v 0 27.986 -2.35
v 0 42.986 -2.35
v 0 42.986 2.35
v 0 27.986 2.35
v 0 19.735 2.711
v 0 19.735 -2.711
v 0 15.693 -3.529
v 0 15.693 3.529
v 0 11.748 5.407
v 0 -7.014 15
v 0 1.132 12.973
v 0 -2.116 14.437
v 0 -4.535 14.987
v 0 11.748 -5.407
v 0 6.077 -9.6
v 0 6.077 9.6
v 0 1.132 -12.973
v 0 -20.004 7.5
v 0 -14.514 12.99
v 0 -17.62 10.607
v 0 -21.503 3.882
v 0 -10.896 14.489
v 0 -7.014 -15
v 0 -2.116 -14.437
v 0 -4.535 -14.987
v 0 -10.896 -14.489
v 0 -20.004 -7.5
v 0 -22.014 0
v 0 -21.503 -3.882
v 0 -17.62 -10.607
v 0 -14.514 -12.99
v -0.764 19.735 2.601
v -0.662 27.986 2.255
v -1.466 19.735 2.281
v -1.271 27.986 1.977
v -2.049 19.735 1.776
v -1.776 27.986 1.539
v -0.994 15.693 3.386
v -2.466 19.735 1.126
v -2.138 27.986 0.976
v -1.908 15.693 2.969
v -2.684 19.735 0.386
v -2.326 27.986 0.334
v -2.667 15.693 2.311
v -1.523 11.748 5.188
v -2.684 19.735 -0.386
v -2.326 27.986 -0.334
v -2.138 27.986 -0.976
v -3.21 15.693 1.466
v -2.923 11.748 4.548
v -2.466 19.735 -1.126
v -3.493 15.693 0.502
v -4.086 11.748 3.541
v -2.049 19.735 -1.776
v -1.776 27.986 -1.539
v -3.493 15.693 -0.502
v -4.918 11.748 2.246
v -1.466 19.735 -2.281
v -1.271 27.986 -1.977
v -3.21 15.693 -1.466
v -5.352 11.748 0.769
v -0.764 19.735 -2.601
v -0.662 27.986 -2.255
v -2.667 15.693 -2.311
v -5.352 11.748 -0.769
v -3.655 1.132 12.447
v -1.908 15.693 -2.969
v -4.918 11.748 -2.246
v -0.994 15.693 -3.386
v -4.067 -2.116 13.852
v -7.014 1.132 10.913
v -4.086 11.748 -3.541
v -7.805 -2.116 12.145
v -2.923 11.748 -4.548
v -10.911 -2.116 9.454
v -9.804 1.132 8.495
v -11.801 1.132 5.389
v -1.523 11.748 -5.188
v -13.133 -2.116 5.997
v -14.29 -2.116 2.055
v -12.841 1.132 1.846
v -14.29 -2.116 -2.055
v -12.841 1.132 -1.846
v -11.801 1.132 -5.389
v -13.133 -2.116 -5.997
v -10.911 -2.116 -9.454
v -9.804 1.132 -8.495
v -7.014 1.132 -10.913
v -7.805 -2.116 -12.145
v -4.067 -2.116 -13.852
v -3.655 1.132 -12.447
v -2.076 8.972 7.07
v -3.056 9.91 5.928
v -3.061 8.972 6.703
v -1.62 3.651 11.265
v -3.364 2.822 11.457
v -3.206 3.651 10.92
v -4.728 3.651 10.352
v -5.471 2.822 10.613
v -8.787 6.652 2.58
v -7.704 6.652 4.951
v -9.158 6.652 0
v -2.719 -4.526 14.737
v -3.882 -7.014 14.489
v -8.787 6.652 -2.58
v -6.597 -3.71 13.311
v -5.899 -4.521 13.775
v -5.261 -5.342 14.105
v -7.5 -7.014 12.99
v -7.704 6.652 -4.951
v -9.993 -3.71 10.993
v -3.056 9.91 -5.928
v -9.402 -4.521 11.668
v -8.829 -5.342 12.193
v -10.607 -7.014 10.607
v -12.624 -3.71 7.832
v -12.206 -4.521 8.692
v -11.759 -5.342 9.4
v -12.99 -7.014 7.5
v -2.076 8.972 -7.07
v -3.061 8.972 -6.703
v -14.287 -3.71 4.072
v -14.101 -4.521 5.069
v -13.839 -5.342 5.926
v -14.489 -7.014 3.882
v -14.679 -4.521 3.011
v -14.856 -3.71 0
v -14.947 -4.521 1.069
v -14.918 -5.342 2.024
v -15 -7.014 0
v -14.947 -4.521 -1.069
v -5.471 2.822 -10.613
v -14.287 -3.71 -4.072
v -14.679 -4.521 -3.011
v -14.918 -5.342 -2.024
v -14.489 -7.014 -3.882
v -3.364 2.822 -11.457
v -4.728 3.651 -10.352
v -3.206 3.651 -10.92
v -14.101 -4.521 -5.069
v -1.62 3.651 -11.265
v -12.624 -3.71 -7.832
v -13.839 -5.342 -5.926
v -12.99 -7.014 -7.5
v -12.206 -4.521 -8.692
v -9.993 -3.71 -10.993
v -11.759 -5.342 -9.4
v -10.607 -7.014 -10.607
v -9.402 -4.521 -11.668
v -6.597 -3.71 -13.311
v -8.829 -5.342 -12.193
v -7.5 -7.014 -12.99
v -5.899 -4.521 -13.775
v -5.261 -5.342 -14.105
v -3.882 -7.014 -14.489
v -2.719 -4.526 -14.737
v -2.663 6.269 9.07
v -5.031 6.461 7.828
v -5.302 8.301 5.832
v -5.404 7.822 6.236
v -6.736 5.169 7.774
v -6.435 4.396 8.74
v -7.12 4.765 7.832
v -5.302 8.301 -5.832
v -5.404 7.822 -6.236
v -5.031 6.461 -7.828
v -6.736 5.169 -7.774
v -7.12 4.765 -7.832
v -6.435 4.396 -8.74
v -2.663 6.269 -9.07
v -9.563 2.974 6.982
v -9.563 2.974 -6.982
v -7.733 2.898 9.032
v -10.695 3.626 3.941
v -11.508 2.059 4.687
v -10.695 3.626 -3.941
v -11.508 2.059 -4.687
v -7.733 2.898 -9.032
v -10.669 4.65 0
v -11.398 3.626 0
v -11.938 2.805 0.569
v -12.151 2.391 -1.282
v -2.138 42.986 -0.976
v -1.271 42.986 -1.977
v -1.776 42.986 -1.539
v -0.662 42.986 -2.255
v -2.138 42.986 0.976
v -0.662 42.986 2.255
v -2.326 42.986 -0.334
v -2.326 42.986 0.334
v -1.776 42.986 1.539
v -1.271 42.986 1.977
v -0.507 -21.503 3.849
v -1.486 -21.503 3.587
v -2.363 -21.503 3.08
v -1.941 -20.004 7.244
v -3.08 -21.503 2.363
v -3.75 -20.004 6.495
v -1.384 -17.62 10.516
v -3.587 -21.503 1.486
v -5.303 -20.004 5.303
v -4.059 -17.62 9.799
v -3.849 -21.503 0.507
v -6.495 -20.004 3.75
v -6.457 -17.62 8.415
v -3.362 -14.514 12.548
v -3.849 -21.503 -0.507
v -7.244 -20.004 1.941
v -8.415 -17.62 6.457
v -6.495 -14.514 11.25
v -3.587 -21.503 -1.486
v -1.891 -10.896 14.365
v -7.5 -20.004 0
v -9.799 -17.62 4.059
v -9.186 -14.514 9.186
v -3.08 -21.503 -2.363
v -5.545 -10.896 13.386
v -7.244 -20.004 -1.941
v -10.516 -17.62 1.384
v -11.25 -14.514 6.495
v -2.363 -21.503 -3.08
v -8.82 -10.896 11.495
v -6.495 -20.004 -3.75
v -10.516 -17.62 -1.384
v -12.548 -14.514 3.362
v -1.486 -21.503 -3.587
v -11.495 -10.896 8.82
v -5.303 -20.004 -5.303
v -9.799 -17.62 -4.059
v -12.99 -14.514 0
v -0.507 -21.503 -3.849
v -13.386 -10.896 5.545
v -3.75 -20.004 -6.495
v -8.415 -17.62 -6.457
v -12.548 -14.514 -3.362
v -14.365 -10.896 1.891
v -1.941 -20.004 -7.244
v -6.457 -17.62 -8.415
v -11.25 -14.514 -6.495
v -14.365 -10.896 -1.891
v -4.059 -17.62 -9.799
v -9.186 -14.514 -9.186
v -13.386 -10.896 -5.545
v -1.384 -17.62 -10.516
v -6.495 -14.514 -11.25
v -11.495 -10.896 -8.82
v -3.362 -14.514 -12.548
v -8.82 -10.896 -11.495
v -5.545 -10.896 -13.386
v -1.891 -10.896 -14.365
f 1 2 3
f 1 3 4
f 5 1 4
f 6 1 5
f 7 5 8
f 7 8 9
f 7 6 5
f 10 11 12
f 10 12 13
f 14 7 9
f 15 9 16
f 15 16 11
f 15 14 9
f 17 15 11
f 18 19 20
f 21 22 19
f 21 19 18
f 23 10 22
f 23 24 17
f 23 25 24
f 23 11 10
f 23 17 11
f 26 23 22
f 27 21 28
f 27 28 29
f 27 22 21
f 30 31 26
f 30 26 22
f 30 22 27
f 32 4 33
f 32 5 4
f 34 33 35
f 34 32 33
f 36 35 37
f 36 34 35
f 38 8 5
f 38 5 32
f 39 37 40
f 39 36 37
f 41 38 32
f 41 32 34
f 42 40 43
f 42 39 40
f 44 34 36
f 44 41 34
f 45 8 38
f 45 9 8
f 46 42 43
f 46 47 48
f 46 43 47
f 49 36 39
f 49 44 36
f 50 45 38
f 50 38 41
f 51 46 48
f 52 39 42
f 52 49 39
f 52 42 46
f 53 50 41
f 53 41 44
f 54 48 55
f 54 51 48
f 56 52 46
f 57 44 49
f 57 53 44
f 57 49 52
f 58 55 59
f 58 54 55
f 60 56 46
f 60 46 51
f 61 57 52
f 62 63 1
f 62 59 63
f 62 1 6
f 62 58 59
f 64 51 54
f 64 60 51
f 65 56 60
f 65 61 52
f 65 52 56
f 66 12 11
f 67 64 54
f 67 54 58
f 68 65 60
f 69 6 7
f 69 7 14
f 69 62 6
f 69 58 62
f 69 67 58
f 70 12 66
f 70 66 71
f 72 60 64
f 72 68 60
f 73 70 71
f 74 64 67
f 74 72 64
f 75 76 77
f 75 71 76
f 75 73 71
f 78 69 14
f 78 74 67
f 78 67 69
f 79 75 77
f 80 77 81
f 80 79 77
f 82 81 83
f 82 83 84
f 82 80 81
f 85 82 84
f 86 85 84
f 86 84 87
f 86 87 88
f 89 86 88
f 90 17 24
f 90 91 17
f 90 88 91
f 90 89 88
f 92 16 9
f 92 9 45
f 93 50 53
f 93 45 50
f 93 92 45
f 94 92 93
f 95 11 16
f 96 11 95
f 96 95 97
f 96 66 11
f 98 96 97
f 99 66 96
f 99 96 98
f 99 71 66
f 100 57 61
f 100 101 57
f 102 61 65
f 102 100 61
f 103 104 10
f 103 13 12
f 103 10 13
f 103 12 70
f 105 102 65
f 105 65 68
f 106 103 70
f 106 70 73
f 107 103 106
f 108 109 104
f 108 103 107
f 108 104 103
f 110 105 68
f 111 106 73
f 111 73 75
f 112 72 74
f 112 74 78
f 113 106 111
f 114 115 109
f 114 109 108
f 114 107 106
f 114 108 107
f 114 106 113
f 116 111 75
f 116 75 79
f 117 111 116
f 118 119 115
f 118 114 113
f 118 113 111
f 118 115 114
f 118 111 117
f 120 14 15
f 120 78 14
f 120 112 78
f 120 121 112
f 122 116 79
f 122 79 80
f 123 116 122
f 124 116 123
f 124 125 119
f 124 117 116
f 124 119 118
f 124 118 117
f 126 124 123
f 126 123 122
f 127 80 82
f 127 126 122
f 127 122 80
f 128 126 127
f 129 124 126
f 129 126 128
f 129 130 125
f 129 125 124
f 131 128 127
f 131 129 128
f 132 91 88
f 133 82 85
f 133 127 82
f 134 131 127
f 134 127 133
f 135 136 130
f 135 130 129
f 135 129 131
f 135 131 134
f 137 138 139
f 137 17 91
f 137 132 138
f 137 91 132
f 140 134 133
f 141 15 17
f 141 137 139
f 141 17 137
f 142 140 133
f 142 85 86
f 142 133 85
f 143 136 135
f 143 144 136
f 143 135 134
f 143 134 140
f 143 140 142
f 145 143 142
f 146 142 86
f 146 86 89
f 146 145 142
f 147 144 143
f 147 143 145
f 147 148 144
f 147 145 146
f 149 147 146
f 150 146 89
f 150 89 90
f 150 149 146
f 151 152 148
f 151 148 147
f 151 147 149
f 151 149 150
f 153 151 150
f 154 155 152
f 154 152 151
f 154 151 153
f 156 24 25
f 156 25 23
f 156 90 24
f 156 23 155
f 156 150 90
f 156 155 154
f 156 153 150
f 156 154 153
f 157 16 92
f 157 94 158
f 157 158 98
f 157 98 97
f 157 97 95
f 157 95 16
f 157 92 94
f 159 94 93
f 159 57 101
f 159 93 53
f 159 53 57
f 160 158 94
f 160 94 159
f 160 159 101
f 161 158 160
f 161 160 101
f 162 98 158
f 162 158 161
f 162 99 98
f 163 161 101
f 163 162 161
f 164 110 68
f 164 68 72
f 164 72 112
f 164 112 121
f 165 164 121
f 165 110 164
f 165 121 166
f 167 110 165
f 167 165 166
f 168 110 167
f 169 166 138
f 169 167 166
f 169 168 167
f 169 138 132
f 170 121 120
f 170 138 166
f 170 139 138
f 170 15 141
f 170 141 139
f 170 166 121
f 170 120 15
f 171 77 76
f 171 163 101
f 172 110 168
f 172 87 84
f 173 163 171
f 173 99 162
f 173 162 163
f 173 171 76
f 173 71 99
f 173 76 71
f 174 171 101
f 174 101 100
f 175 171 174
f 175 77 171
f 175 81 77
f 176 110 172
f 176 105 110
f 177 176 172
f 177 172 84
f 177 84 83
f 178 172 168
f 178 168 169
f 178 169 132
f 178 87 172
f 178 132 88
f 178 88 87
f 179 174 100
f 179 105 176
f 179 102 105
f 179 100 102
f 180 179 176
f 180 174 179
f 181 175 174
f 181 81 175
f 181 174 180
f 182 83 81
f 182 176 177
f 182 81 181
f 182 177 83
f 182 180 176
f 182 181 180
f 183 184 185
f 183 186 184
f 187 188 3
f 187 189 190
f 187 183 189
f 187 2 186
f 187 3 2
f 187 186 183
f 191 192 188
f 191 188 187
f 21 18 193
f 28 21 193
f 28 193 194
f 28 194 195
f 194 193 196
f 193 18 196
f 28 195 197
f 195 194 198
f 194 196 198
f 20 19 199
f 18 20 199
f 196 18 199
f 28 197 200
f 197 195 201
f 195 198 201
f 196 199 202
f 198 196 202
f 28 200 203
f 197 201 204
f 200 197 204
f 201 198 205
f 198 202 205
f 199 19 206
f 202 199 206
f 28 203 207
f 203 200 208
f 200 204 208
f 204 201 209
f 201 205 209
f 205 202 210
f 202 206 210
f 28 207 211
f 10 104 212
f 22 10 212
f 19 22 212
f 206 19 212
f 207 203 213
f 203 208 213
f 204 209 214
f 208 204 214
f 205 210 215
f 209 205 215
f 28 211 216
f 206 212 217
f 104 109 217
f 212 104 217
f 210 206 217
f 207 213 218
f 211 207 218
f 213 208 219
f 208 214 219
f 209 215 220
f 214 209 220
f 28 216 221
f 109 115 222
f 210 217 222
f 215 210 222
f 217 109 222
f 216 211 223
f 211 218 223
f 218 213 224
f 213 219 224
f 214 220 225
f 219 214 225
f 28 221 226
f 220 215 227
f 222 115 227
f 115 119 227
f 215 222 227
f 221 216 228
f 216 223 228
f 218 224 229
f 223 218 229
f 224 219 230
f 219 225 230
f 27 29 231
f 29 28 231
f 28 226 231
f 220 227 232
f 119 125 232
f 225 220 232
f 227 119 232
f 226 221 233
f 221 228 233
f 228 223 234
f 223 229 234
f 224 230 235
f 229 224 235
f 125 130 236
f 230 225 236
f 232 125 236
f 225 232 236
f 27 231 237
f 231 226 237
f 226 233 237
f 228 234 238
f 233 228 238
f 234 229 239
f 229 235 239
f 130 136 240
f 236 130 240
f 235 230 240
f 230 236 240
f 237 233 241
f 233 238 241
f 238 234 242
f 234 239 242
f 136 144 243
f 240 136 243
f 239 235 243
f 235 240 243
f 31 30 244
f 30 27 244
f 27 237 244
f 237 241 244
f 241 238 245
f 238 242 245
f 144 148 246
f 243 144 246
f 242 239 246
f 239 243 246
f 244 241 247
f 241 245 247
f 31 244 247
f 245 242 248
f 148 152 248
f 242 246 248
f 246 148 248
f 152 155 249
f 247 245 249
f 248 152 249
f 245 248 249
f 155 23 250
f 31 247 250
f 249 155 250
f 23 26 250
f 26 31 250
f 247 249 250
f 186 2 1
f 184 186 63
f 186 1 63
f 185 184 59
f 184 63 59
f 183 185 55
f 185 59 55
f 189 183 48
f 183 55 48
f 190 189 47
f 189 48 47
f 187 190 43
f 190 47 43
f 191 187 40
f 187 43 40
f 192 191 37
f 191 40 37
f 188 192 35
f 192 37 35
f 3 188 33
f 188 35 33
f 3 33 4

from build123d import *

# Parameters (mm, degrees)
SKETCH2_R               = 2.35
BOSS_EXTRUDE1_DEPTH     = 15
CUT_EXTRUDE2_DEPTH      = 25
CUT_EXTRUDE2_DEPTH_BACK = 25


with BuildPart() as part:
    # Sketch1 → Revolve2 (revolve)
    with BuildSketch(Plane.XY, mode=Mode.PRIVATE) as revolve2_sk:
        with BuildLine():
            Line((0, 27.986111111), (0, -7.013888889))
            Line((0, -7.013888889), (0, -22.013888889))
            ThreePointArc((0, -22.013888889), (10.606601718, -17.620490607), (15, -7.013888889))
            add(Edge.make_bspline(
                [(2.35, 27.986111111), (2.599847264, 21.390422987), (1.849692868, 12.096697956), (15.855089794, 0.539943119), (15, -7.013888889)],
                knots=[0, 0, 0, 0, 0.452531855, 1, 1, 1, 1], degree=3))
            Line((2.35, 27.986111111), (0, 27.986111111))
        make_face()
    revolve(revolve2_sk.sketch.rotate(Axis((0, 27.986111111, 0), (0, -1, 0)), 180), axis=Axis((0, 27.986111111, 0), (0, -1, 0)))  # turned: the seam where the file's is

    # Sketch2 → Boss-Extrude1 (add)
    with BuildSketch(Plane(origin=(0, 27.986111111, 0), x_dir=(1, 0, 0), z_dir=(0, 1, 0))):
        with Locations(Location((0, 0, 0), (0, 0, 180))):  # turned: the seam where the file's is
            Circle(SKETCH2_R)
    extrude(amount=BOSS_EXTRUDE1_DEPTH)

    # Sketch3 → Cut-Extrude2 (cut, two sides)
    with BuildSketch(Plane.XY) as cut_extrude2_sk:
        Polygon((0, 42.986111111), (0, 27.986111111), (0, -22.013888889), (0, -24.288490859), (33.029158628, -24.288490859), (33.029158628, 42.986111111), align=None)
    extrude(amount=CUT_EXTRUDE2_DEPTH, mode=Mode.SUBTRACT)
    extrude(cut_extrude2_sk.sketch, amount=-CUT_EXTRUDE2_DEPTH_BACK, mode=Mode.SUBTRACT)


solid = part.part
